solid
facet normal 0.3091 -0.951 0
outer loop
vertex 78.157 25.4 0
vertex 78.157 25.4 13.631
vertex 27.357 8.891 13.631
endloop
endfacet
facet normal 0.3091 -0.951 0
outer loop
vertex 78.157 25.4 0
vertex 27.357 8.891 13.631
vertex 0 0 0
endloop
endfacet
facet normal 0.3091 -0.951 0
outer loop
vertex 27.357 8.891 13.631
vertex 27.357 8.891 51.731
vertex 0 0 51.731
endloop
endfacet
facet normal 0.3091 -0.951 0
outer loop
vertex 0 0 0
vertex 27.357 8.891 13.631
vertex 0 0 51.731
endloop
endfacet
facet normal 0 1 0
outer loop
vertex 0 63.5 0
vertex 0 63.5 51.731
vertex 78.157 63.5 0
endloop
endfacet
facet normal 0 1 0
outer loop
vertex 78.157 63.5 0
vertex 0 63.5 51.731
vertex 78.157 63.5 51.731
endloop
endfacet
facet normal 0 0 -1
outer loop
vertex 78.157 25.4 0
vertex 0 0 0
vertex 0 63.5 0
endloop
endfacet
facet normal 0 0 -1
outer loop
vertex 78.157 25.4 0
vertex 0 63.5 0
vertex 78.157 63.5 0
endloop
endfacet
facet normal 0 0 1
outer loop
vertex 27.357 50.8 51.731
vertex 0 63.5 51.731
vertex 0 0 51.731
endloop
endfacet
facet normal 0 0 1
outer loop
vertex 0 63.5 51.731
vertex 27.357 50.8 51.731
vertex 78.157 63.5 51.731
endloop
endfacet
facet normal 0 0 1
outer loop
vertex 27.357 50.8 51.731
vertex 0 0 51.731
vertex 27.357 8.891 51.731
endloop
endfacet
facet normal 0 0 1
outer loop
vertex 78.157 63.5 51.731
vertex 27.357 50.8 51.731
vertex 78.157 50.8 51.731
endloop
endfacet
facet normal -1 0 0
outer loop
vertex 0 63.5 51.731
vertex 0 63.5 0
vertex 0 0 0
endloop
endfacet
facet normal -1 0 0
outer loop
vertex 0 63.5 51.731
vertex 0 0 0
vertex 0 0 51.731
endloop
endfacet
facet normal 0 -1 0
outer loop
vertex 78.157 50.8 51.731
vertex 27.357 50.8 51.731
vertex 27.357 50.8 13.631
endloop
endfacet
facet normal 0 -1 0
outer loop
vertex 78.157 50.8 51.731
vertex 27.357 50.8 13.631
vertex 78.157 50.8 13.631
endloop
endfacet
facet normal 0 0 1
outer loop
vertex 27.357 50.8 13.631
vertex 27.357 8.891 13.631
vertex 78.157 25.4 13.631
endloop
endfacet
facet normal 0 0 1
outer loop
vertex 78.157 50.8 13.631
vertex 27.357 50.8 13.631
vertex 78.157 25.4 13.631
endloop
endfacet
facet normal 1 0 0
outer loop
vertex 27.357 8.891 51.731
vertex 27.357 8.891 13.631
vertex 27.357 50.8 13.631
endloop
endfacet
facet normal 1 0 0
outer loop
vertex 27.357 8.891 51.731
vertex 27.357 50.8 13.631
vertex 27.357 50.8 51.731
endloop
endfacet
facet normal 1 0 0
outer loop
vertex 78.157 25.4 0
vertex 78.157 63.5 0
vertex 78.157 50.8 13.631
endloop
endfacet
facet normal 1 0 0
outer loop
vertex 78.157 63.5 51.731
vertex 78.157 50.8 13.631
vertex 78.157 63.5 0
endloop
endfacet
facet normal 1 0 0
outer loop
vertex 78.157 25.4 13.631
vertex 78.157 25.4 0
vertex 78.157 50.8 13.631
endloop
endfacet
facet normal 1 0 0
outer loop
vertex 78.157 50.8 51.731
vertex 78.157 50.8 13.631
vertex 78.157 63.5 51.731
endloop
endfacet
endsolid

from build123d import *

# Parameters (mm, degrees)
F0_W     = 78.157008
F0_H     = 51.731035
F1_DEPTH = 63.5
F3_DEPTH = 51.732035
F4_W     = 50.8
F4_H     = 38.1
F5_DEPTH = 50.8


with BuildPart() as f1:
    # F0 (on Front) → F1 (new body)
    with BuildSketch(Plane.XZ):
        with Locations((39.078504, 25.865517)):
            Rectangle(F0_W, F0_H)
    extrude(amount=-F1_DEPTH)

    # F2 (on face) → F3 (cut, through all)
    with BuildSketch(Plane.XY.offset(51.731035)):
        Polygon((78.157008, 25.4), (0, 0), (78.157008, 0), align=None)
    extrude(amount=-F3_DEPTH, mode=Mode.SUBTRACT)

    # F4 (on Front) → F5 (cut)
    with BuildSketch(Plane.XZ):
        with Locations((52.757008, 32.681035)):
            Rectangle(F4_W, F4_H)
    extrude(amount=-F5_DEPTH, mode=Mode.SUBTRACT)


solid = f1.part
